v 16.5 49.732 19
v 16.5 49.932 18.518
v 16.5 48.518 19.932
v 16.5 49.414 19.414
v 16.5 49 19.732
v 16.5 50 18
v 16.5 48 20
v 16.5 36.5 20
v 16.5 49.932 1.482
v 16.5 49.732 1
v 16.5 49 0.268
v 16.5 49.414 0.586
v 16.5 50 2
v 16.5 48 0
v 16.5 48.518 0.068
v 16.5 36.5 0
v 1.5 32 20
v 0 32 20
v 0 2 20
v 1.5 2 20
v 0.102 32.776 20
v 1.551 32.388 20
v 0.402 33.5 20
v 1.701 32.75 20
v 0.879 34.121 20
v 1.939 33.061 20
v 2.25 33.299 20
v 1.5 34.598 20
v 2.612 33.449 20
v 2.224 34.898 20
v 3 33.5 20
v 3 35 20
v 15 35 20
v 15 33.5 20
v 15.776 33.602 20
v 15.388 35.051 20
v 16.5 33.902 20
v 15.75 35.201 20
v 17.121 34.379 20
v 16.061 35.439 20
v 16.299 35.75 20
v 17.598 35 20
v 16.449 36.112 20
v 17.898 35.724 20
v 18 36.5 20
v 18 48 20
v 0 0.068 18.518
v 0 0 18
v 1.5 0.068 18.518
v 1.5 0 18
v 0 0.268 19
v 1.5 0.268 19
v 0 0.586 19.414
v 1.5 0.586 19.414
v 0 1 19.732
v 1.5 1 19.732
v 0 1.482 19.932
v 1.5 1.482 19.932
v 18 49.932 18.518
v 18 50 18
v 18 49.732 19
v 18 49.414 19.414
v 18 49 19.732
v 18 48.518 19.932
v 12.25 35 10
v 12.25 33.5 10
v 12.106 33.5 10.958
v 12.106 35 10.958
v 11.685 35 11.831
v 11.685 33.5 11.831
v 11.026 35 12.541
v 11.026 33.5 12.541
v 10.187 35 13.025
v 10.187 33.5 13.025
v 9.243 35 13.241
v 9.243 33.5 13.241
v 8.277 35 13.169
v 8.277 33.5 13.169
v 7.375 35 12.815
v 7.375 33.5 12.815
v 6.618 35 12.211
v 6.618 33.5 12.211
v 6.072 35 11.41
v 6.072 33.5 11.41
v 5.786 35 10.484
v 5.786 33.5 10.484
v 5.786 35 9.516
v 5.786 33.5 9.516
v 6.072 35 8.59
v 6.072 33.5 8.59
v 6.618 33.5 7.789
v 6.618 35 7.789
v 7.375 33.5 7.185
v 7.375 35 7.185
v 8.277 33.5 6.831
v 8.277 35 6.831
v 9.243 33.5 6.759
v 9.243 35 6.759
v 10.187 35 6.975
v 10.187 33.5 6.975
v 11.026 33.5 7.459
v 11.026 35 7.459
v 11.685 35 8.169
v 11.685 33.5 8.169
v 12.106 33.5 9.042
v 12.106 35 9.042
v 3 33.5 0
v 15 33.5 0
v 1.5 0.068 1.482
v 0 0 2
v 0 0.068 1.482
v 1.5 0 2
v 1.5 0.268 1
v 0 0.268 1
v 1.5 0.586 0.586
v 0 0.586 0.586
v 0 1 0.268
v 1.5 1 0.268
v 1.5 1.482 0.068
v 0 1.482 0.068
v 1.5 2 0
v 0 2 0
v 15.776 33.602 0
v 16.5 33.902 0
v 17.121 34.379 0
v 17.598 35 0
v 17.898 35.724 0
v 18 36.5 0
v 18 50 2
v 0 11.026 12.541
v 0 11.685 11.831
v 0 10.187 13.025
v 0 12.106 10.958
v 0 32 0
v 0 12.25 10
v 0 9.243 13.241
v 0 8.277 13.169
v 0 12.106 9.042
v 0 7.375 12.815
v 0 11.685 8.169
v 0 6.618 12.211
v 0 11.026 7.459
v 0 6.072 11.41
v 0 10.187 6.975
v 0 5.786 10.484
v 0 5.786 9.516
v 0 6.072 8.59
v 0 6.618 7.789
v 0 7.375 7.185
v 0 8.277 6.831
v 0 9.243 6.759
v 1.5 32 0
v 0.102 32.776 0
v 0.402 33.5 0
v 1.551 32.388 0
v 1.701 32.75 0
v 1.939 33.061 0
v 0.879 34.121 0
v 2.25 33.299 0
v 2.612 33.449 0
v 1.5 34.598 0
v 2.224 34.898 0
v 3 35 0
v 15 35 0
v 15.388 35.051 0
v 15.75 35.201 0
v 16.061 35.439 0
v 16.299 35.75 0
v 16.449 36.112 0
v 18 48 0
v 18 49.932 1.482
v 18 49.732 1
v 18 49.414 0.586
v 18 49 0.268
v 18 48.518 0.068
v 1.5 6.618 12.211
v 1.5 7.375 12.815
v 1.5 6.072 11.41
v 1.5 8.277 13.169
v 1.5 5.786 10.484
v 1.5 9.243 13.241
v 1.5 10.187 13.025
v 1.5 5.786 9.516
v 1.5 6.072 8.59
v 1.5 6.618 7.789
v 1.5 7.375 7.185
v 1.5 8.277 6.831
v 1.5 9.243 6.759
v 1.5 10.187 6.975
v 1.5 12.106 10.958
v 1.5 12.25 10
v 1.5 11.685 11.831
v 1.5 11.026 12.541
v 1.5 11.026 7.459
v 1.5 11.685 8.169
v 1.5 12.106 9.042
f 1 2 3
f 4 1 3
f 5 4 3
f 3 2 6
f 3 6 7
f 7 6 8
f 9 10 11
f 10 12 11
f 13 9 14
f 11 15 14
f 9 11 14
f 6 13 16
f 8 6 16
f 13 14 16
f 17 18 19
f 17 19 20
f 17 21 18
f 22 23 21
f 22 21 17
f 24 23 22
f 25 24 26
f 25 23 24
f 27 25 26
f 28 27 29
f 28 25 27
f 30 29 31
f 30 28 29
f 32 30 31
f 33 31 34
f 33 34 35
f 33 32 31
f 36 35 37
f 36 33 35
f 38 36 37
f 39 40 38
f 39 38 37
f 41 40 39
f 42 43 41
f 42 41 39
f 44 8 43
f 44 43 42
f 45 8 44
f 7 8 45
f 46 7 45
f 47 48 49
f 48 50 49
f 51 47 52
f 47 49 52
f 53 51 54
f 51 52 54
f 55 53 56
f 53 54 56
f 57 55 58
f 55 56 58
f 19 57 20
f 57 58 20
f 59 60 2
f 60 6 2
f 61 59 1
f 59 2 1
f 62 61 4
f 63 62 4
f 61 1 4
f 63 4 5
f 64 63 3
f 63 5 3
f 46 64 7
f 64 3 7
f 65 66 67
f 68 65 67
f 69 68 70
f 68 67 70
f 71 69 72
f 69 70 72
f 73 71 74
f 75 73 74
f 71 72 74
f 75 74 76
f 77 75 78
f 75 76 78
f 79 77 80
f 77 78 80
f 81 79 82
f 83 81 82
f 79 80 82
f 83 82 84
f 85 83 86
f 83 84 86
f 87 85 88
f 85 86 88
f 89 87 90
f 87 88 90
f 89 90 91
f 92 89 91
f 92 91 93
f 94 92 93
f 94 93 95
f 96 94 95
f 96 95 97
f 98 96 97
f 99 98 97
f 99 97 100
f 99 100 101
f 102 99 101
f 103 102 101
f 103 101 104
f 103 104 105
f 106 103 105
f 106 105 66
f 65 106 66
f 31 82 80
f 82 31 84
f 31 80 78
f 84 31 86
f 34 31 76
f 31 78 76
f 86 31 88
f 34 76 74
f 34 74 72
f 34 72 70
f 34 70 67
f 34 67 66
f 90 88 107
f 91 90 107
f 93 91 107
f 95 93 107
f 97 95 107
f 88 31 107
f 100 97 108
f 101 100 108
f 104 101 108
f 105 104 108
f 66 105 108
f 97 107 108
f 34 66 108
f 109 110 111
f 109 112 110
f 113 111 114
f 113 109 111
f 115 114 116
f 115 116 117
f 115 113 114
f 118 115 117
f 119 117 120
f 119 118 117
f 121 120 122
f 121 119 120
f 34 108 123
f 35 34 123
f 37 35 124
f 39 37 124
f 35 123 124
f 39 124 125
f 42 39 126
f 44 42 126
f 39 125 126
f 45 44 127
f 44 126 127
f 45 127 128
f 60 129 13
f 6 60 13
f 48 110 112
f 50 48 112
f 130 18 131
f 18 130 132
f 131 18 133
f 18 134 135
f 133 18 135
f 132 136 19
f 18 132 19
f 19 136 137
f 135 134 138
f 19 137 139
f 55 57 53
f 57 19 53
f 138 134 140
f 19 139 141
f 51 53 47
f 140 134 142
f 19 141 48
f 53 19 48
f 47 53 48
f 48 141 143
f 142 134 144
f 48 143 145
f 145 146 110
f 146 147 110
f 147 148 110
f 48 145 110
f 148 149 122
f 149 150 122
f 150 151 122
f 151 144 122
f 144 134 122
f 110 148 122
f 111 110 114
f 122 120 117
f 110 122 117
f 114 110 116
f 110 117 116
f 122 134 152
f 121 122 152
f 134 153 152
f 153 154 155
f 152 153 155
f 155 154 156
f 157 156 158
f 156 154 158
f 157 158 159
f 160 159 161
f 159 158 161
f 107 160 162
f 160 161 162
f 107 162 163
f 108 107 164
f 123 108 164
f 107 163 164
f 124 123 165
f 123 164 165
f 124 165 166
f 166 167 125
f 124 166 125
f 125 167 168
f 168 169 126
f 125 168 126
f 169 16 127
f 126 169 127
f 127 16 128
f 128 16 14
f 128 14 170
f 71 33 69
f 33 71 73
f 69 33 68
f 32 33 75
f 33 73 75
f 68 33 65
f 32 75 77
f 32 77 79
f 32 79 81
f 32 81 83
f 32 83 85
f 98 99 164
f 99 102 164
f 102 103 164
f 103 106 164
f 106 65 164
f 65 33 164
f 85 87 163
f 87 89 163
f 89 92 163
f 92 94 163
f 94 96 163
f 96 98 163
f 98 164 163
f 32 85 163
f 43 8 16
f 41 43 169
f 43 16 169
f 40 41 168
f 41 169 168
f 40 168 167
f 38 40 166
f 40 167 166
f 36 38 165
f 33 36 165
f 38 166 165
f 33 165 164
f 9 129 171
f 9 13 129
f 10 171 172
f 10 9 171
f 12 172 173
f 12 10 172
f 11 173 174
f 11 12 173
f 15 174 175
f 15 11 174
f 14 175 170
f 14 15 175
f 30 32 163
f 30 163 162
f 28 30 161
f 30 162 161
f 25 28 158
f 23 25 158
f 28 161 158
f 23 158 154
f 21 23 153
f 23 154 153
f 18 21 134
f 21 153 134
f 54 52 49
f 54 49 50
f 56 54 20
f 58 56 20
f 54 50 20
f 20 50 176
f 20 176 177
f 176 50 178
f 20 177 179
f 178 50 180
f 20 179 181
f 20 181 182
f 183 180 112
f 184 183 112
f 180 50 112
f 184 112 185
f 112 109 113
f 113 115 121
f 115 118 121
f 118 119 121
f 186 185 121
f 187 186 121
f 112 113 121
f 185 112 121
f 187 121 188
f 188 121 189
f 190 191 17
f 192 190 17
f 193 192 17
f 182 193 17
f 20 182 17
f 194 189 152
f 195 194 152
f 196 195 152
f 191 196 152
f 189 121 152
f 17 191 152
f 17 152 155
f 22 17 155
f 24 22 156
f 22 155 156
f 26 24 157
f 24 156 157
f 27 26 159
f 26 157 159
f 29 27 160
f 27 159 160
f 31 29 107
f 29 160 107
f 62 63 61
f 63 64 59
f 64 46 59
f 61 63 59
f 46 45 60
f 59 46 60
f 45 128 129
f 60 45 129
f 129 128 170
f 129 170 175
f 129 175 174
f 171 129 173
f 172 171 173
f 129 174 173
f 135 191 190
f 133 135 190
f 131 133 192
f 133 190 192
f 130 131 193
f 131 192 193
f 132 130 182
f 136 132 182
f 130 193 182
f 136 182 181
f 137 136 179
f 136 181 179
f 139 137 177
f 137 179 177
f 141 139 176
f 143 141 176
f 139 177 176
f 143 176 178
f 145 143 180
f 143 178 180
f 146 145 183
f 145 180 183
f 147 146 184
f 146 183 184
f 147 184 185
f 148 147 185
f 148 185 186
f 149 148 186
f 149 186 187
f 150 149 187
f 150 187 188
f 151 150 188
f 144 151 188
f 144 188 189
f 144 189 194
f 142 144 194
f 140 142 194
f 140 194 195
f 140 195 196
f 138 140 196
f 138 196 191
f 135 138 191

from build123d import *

# Parameters (mm, degrees)
F1_DEPTH = 20
F2_R     = 2
F3_R     = 3.25
F4_DEPTH = 50
F5_R     = 3.25
F6_DEPTH = 25


with BuildPart() as f1:
    # F0 (on Top) → F1 (new body)
    with BuildSketch(Plane.XY):
        with BuildLine():
            Line((0, 32), (0, 0))
            Line((0, 0), (1.5, 0))
            Line((1.5, 0), (1.5, 32))
            ThreePointArc((1.5, 32), (1.93934, 33.06066), (3, 33.5))
            Line((3, 33.5), (15, 33.5))
            ThreePointArc((15, 33.5), (17.12132, 34.37868), (18, 36.5))
            Line((18, 36.5), (18, 50))
            Line((18, 50), (16.5, 50))
            Line((16.5, 50), (16.5, 36.5))
            ThreePointArc((16.5, 36.5), (16.06066, 35.43934), (15, 35))
            Line((15, 35), (3, 35))
            ThreePointArc((3, 35), (0.87868, 34.12132), (0, 32))
        make_face()
    extrude(amount=F1_DEPTH)

    # F2
    f2_edges = [f1.edges().sort_by_distance(p)[0] for p in [
        (0.75, 0, 20),
        (0.75, 0, 0),
        (17.25, 50, 20),
        (17.25, 50, 0),
    ]]
    fillet(f2_edges, radius=F2_R)

    # F3 (on face) → F4 (cut)
    with BuildSketch(Plane.YZ.offset(18)):
        with Locations((9, 10)):
            Circle(F3_R)
    extrude(amount=-F4_DEPTH, mode=Mode.SUBTRACT)

    # F5 (on face) → F6 (cut)
    with BuildSketch(Plane.XZ.offset(-33.5)):
        with Locations((9, 10)):
            Circle(F5_R)
    extrude(amount=-F6_DEPTH, mode=Mode.SUBTRACT)


solid = f1.part
